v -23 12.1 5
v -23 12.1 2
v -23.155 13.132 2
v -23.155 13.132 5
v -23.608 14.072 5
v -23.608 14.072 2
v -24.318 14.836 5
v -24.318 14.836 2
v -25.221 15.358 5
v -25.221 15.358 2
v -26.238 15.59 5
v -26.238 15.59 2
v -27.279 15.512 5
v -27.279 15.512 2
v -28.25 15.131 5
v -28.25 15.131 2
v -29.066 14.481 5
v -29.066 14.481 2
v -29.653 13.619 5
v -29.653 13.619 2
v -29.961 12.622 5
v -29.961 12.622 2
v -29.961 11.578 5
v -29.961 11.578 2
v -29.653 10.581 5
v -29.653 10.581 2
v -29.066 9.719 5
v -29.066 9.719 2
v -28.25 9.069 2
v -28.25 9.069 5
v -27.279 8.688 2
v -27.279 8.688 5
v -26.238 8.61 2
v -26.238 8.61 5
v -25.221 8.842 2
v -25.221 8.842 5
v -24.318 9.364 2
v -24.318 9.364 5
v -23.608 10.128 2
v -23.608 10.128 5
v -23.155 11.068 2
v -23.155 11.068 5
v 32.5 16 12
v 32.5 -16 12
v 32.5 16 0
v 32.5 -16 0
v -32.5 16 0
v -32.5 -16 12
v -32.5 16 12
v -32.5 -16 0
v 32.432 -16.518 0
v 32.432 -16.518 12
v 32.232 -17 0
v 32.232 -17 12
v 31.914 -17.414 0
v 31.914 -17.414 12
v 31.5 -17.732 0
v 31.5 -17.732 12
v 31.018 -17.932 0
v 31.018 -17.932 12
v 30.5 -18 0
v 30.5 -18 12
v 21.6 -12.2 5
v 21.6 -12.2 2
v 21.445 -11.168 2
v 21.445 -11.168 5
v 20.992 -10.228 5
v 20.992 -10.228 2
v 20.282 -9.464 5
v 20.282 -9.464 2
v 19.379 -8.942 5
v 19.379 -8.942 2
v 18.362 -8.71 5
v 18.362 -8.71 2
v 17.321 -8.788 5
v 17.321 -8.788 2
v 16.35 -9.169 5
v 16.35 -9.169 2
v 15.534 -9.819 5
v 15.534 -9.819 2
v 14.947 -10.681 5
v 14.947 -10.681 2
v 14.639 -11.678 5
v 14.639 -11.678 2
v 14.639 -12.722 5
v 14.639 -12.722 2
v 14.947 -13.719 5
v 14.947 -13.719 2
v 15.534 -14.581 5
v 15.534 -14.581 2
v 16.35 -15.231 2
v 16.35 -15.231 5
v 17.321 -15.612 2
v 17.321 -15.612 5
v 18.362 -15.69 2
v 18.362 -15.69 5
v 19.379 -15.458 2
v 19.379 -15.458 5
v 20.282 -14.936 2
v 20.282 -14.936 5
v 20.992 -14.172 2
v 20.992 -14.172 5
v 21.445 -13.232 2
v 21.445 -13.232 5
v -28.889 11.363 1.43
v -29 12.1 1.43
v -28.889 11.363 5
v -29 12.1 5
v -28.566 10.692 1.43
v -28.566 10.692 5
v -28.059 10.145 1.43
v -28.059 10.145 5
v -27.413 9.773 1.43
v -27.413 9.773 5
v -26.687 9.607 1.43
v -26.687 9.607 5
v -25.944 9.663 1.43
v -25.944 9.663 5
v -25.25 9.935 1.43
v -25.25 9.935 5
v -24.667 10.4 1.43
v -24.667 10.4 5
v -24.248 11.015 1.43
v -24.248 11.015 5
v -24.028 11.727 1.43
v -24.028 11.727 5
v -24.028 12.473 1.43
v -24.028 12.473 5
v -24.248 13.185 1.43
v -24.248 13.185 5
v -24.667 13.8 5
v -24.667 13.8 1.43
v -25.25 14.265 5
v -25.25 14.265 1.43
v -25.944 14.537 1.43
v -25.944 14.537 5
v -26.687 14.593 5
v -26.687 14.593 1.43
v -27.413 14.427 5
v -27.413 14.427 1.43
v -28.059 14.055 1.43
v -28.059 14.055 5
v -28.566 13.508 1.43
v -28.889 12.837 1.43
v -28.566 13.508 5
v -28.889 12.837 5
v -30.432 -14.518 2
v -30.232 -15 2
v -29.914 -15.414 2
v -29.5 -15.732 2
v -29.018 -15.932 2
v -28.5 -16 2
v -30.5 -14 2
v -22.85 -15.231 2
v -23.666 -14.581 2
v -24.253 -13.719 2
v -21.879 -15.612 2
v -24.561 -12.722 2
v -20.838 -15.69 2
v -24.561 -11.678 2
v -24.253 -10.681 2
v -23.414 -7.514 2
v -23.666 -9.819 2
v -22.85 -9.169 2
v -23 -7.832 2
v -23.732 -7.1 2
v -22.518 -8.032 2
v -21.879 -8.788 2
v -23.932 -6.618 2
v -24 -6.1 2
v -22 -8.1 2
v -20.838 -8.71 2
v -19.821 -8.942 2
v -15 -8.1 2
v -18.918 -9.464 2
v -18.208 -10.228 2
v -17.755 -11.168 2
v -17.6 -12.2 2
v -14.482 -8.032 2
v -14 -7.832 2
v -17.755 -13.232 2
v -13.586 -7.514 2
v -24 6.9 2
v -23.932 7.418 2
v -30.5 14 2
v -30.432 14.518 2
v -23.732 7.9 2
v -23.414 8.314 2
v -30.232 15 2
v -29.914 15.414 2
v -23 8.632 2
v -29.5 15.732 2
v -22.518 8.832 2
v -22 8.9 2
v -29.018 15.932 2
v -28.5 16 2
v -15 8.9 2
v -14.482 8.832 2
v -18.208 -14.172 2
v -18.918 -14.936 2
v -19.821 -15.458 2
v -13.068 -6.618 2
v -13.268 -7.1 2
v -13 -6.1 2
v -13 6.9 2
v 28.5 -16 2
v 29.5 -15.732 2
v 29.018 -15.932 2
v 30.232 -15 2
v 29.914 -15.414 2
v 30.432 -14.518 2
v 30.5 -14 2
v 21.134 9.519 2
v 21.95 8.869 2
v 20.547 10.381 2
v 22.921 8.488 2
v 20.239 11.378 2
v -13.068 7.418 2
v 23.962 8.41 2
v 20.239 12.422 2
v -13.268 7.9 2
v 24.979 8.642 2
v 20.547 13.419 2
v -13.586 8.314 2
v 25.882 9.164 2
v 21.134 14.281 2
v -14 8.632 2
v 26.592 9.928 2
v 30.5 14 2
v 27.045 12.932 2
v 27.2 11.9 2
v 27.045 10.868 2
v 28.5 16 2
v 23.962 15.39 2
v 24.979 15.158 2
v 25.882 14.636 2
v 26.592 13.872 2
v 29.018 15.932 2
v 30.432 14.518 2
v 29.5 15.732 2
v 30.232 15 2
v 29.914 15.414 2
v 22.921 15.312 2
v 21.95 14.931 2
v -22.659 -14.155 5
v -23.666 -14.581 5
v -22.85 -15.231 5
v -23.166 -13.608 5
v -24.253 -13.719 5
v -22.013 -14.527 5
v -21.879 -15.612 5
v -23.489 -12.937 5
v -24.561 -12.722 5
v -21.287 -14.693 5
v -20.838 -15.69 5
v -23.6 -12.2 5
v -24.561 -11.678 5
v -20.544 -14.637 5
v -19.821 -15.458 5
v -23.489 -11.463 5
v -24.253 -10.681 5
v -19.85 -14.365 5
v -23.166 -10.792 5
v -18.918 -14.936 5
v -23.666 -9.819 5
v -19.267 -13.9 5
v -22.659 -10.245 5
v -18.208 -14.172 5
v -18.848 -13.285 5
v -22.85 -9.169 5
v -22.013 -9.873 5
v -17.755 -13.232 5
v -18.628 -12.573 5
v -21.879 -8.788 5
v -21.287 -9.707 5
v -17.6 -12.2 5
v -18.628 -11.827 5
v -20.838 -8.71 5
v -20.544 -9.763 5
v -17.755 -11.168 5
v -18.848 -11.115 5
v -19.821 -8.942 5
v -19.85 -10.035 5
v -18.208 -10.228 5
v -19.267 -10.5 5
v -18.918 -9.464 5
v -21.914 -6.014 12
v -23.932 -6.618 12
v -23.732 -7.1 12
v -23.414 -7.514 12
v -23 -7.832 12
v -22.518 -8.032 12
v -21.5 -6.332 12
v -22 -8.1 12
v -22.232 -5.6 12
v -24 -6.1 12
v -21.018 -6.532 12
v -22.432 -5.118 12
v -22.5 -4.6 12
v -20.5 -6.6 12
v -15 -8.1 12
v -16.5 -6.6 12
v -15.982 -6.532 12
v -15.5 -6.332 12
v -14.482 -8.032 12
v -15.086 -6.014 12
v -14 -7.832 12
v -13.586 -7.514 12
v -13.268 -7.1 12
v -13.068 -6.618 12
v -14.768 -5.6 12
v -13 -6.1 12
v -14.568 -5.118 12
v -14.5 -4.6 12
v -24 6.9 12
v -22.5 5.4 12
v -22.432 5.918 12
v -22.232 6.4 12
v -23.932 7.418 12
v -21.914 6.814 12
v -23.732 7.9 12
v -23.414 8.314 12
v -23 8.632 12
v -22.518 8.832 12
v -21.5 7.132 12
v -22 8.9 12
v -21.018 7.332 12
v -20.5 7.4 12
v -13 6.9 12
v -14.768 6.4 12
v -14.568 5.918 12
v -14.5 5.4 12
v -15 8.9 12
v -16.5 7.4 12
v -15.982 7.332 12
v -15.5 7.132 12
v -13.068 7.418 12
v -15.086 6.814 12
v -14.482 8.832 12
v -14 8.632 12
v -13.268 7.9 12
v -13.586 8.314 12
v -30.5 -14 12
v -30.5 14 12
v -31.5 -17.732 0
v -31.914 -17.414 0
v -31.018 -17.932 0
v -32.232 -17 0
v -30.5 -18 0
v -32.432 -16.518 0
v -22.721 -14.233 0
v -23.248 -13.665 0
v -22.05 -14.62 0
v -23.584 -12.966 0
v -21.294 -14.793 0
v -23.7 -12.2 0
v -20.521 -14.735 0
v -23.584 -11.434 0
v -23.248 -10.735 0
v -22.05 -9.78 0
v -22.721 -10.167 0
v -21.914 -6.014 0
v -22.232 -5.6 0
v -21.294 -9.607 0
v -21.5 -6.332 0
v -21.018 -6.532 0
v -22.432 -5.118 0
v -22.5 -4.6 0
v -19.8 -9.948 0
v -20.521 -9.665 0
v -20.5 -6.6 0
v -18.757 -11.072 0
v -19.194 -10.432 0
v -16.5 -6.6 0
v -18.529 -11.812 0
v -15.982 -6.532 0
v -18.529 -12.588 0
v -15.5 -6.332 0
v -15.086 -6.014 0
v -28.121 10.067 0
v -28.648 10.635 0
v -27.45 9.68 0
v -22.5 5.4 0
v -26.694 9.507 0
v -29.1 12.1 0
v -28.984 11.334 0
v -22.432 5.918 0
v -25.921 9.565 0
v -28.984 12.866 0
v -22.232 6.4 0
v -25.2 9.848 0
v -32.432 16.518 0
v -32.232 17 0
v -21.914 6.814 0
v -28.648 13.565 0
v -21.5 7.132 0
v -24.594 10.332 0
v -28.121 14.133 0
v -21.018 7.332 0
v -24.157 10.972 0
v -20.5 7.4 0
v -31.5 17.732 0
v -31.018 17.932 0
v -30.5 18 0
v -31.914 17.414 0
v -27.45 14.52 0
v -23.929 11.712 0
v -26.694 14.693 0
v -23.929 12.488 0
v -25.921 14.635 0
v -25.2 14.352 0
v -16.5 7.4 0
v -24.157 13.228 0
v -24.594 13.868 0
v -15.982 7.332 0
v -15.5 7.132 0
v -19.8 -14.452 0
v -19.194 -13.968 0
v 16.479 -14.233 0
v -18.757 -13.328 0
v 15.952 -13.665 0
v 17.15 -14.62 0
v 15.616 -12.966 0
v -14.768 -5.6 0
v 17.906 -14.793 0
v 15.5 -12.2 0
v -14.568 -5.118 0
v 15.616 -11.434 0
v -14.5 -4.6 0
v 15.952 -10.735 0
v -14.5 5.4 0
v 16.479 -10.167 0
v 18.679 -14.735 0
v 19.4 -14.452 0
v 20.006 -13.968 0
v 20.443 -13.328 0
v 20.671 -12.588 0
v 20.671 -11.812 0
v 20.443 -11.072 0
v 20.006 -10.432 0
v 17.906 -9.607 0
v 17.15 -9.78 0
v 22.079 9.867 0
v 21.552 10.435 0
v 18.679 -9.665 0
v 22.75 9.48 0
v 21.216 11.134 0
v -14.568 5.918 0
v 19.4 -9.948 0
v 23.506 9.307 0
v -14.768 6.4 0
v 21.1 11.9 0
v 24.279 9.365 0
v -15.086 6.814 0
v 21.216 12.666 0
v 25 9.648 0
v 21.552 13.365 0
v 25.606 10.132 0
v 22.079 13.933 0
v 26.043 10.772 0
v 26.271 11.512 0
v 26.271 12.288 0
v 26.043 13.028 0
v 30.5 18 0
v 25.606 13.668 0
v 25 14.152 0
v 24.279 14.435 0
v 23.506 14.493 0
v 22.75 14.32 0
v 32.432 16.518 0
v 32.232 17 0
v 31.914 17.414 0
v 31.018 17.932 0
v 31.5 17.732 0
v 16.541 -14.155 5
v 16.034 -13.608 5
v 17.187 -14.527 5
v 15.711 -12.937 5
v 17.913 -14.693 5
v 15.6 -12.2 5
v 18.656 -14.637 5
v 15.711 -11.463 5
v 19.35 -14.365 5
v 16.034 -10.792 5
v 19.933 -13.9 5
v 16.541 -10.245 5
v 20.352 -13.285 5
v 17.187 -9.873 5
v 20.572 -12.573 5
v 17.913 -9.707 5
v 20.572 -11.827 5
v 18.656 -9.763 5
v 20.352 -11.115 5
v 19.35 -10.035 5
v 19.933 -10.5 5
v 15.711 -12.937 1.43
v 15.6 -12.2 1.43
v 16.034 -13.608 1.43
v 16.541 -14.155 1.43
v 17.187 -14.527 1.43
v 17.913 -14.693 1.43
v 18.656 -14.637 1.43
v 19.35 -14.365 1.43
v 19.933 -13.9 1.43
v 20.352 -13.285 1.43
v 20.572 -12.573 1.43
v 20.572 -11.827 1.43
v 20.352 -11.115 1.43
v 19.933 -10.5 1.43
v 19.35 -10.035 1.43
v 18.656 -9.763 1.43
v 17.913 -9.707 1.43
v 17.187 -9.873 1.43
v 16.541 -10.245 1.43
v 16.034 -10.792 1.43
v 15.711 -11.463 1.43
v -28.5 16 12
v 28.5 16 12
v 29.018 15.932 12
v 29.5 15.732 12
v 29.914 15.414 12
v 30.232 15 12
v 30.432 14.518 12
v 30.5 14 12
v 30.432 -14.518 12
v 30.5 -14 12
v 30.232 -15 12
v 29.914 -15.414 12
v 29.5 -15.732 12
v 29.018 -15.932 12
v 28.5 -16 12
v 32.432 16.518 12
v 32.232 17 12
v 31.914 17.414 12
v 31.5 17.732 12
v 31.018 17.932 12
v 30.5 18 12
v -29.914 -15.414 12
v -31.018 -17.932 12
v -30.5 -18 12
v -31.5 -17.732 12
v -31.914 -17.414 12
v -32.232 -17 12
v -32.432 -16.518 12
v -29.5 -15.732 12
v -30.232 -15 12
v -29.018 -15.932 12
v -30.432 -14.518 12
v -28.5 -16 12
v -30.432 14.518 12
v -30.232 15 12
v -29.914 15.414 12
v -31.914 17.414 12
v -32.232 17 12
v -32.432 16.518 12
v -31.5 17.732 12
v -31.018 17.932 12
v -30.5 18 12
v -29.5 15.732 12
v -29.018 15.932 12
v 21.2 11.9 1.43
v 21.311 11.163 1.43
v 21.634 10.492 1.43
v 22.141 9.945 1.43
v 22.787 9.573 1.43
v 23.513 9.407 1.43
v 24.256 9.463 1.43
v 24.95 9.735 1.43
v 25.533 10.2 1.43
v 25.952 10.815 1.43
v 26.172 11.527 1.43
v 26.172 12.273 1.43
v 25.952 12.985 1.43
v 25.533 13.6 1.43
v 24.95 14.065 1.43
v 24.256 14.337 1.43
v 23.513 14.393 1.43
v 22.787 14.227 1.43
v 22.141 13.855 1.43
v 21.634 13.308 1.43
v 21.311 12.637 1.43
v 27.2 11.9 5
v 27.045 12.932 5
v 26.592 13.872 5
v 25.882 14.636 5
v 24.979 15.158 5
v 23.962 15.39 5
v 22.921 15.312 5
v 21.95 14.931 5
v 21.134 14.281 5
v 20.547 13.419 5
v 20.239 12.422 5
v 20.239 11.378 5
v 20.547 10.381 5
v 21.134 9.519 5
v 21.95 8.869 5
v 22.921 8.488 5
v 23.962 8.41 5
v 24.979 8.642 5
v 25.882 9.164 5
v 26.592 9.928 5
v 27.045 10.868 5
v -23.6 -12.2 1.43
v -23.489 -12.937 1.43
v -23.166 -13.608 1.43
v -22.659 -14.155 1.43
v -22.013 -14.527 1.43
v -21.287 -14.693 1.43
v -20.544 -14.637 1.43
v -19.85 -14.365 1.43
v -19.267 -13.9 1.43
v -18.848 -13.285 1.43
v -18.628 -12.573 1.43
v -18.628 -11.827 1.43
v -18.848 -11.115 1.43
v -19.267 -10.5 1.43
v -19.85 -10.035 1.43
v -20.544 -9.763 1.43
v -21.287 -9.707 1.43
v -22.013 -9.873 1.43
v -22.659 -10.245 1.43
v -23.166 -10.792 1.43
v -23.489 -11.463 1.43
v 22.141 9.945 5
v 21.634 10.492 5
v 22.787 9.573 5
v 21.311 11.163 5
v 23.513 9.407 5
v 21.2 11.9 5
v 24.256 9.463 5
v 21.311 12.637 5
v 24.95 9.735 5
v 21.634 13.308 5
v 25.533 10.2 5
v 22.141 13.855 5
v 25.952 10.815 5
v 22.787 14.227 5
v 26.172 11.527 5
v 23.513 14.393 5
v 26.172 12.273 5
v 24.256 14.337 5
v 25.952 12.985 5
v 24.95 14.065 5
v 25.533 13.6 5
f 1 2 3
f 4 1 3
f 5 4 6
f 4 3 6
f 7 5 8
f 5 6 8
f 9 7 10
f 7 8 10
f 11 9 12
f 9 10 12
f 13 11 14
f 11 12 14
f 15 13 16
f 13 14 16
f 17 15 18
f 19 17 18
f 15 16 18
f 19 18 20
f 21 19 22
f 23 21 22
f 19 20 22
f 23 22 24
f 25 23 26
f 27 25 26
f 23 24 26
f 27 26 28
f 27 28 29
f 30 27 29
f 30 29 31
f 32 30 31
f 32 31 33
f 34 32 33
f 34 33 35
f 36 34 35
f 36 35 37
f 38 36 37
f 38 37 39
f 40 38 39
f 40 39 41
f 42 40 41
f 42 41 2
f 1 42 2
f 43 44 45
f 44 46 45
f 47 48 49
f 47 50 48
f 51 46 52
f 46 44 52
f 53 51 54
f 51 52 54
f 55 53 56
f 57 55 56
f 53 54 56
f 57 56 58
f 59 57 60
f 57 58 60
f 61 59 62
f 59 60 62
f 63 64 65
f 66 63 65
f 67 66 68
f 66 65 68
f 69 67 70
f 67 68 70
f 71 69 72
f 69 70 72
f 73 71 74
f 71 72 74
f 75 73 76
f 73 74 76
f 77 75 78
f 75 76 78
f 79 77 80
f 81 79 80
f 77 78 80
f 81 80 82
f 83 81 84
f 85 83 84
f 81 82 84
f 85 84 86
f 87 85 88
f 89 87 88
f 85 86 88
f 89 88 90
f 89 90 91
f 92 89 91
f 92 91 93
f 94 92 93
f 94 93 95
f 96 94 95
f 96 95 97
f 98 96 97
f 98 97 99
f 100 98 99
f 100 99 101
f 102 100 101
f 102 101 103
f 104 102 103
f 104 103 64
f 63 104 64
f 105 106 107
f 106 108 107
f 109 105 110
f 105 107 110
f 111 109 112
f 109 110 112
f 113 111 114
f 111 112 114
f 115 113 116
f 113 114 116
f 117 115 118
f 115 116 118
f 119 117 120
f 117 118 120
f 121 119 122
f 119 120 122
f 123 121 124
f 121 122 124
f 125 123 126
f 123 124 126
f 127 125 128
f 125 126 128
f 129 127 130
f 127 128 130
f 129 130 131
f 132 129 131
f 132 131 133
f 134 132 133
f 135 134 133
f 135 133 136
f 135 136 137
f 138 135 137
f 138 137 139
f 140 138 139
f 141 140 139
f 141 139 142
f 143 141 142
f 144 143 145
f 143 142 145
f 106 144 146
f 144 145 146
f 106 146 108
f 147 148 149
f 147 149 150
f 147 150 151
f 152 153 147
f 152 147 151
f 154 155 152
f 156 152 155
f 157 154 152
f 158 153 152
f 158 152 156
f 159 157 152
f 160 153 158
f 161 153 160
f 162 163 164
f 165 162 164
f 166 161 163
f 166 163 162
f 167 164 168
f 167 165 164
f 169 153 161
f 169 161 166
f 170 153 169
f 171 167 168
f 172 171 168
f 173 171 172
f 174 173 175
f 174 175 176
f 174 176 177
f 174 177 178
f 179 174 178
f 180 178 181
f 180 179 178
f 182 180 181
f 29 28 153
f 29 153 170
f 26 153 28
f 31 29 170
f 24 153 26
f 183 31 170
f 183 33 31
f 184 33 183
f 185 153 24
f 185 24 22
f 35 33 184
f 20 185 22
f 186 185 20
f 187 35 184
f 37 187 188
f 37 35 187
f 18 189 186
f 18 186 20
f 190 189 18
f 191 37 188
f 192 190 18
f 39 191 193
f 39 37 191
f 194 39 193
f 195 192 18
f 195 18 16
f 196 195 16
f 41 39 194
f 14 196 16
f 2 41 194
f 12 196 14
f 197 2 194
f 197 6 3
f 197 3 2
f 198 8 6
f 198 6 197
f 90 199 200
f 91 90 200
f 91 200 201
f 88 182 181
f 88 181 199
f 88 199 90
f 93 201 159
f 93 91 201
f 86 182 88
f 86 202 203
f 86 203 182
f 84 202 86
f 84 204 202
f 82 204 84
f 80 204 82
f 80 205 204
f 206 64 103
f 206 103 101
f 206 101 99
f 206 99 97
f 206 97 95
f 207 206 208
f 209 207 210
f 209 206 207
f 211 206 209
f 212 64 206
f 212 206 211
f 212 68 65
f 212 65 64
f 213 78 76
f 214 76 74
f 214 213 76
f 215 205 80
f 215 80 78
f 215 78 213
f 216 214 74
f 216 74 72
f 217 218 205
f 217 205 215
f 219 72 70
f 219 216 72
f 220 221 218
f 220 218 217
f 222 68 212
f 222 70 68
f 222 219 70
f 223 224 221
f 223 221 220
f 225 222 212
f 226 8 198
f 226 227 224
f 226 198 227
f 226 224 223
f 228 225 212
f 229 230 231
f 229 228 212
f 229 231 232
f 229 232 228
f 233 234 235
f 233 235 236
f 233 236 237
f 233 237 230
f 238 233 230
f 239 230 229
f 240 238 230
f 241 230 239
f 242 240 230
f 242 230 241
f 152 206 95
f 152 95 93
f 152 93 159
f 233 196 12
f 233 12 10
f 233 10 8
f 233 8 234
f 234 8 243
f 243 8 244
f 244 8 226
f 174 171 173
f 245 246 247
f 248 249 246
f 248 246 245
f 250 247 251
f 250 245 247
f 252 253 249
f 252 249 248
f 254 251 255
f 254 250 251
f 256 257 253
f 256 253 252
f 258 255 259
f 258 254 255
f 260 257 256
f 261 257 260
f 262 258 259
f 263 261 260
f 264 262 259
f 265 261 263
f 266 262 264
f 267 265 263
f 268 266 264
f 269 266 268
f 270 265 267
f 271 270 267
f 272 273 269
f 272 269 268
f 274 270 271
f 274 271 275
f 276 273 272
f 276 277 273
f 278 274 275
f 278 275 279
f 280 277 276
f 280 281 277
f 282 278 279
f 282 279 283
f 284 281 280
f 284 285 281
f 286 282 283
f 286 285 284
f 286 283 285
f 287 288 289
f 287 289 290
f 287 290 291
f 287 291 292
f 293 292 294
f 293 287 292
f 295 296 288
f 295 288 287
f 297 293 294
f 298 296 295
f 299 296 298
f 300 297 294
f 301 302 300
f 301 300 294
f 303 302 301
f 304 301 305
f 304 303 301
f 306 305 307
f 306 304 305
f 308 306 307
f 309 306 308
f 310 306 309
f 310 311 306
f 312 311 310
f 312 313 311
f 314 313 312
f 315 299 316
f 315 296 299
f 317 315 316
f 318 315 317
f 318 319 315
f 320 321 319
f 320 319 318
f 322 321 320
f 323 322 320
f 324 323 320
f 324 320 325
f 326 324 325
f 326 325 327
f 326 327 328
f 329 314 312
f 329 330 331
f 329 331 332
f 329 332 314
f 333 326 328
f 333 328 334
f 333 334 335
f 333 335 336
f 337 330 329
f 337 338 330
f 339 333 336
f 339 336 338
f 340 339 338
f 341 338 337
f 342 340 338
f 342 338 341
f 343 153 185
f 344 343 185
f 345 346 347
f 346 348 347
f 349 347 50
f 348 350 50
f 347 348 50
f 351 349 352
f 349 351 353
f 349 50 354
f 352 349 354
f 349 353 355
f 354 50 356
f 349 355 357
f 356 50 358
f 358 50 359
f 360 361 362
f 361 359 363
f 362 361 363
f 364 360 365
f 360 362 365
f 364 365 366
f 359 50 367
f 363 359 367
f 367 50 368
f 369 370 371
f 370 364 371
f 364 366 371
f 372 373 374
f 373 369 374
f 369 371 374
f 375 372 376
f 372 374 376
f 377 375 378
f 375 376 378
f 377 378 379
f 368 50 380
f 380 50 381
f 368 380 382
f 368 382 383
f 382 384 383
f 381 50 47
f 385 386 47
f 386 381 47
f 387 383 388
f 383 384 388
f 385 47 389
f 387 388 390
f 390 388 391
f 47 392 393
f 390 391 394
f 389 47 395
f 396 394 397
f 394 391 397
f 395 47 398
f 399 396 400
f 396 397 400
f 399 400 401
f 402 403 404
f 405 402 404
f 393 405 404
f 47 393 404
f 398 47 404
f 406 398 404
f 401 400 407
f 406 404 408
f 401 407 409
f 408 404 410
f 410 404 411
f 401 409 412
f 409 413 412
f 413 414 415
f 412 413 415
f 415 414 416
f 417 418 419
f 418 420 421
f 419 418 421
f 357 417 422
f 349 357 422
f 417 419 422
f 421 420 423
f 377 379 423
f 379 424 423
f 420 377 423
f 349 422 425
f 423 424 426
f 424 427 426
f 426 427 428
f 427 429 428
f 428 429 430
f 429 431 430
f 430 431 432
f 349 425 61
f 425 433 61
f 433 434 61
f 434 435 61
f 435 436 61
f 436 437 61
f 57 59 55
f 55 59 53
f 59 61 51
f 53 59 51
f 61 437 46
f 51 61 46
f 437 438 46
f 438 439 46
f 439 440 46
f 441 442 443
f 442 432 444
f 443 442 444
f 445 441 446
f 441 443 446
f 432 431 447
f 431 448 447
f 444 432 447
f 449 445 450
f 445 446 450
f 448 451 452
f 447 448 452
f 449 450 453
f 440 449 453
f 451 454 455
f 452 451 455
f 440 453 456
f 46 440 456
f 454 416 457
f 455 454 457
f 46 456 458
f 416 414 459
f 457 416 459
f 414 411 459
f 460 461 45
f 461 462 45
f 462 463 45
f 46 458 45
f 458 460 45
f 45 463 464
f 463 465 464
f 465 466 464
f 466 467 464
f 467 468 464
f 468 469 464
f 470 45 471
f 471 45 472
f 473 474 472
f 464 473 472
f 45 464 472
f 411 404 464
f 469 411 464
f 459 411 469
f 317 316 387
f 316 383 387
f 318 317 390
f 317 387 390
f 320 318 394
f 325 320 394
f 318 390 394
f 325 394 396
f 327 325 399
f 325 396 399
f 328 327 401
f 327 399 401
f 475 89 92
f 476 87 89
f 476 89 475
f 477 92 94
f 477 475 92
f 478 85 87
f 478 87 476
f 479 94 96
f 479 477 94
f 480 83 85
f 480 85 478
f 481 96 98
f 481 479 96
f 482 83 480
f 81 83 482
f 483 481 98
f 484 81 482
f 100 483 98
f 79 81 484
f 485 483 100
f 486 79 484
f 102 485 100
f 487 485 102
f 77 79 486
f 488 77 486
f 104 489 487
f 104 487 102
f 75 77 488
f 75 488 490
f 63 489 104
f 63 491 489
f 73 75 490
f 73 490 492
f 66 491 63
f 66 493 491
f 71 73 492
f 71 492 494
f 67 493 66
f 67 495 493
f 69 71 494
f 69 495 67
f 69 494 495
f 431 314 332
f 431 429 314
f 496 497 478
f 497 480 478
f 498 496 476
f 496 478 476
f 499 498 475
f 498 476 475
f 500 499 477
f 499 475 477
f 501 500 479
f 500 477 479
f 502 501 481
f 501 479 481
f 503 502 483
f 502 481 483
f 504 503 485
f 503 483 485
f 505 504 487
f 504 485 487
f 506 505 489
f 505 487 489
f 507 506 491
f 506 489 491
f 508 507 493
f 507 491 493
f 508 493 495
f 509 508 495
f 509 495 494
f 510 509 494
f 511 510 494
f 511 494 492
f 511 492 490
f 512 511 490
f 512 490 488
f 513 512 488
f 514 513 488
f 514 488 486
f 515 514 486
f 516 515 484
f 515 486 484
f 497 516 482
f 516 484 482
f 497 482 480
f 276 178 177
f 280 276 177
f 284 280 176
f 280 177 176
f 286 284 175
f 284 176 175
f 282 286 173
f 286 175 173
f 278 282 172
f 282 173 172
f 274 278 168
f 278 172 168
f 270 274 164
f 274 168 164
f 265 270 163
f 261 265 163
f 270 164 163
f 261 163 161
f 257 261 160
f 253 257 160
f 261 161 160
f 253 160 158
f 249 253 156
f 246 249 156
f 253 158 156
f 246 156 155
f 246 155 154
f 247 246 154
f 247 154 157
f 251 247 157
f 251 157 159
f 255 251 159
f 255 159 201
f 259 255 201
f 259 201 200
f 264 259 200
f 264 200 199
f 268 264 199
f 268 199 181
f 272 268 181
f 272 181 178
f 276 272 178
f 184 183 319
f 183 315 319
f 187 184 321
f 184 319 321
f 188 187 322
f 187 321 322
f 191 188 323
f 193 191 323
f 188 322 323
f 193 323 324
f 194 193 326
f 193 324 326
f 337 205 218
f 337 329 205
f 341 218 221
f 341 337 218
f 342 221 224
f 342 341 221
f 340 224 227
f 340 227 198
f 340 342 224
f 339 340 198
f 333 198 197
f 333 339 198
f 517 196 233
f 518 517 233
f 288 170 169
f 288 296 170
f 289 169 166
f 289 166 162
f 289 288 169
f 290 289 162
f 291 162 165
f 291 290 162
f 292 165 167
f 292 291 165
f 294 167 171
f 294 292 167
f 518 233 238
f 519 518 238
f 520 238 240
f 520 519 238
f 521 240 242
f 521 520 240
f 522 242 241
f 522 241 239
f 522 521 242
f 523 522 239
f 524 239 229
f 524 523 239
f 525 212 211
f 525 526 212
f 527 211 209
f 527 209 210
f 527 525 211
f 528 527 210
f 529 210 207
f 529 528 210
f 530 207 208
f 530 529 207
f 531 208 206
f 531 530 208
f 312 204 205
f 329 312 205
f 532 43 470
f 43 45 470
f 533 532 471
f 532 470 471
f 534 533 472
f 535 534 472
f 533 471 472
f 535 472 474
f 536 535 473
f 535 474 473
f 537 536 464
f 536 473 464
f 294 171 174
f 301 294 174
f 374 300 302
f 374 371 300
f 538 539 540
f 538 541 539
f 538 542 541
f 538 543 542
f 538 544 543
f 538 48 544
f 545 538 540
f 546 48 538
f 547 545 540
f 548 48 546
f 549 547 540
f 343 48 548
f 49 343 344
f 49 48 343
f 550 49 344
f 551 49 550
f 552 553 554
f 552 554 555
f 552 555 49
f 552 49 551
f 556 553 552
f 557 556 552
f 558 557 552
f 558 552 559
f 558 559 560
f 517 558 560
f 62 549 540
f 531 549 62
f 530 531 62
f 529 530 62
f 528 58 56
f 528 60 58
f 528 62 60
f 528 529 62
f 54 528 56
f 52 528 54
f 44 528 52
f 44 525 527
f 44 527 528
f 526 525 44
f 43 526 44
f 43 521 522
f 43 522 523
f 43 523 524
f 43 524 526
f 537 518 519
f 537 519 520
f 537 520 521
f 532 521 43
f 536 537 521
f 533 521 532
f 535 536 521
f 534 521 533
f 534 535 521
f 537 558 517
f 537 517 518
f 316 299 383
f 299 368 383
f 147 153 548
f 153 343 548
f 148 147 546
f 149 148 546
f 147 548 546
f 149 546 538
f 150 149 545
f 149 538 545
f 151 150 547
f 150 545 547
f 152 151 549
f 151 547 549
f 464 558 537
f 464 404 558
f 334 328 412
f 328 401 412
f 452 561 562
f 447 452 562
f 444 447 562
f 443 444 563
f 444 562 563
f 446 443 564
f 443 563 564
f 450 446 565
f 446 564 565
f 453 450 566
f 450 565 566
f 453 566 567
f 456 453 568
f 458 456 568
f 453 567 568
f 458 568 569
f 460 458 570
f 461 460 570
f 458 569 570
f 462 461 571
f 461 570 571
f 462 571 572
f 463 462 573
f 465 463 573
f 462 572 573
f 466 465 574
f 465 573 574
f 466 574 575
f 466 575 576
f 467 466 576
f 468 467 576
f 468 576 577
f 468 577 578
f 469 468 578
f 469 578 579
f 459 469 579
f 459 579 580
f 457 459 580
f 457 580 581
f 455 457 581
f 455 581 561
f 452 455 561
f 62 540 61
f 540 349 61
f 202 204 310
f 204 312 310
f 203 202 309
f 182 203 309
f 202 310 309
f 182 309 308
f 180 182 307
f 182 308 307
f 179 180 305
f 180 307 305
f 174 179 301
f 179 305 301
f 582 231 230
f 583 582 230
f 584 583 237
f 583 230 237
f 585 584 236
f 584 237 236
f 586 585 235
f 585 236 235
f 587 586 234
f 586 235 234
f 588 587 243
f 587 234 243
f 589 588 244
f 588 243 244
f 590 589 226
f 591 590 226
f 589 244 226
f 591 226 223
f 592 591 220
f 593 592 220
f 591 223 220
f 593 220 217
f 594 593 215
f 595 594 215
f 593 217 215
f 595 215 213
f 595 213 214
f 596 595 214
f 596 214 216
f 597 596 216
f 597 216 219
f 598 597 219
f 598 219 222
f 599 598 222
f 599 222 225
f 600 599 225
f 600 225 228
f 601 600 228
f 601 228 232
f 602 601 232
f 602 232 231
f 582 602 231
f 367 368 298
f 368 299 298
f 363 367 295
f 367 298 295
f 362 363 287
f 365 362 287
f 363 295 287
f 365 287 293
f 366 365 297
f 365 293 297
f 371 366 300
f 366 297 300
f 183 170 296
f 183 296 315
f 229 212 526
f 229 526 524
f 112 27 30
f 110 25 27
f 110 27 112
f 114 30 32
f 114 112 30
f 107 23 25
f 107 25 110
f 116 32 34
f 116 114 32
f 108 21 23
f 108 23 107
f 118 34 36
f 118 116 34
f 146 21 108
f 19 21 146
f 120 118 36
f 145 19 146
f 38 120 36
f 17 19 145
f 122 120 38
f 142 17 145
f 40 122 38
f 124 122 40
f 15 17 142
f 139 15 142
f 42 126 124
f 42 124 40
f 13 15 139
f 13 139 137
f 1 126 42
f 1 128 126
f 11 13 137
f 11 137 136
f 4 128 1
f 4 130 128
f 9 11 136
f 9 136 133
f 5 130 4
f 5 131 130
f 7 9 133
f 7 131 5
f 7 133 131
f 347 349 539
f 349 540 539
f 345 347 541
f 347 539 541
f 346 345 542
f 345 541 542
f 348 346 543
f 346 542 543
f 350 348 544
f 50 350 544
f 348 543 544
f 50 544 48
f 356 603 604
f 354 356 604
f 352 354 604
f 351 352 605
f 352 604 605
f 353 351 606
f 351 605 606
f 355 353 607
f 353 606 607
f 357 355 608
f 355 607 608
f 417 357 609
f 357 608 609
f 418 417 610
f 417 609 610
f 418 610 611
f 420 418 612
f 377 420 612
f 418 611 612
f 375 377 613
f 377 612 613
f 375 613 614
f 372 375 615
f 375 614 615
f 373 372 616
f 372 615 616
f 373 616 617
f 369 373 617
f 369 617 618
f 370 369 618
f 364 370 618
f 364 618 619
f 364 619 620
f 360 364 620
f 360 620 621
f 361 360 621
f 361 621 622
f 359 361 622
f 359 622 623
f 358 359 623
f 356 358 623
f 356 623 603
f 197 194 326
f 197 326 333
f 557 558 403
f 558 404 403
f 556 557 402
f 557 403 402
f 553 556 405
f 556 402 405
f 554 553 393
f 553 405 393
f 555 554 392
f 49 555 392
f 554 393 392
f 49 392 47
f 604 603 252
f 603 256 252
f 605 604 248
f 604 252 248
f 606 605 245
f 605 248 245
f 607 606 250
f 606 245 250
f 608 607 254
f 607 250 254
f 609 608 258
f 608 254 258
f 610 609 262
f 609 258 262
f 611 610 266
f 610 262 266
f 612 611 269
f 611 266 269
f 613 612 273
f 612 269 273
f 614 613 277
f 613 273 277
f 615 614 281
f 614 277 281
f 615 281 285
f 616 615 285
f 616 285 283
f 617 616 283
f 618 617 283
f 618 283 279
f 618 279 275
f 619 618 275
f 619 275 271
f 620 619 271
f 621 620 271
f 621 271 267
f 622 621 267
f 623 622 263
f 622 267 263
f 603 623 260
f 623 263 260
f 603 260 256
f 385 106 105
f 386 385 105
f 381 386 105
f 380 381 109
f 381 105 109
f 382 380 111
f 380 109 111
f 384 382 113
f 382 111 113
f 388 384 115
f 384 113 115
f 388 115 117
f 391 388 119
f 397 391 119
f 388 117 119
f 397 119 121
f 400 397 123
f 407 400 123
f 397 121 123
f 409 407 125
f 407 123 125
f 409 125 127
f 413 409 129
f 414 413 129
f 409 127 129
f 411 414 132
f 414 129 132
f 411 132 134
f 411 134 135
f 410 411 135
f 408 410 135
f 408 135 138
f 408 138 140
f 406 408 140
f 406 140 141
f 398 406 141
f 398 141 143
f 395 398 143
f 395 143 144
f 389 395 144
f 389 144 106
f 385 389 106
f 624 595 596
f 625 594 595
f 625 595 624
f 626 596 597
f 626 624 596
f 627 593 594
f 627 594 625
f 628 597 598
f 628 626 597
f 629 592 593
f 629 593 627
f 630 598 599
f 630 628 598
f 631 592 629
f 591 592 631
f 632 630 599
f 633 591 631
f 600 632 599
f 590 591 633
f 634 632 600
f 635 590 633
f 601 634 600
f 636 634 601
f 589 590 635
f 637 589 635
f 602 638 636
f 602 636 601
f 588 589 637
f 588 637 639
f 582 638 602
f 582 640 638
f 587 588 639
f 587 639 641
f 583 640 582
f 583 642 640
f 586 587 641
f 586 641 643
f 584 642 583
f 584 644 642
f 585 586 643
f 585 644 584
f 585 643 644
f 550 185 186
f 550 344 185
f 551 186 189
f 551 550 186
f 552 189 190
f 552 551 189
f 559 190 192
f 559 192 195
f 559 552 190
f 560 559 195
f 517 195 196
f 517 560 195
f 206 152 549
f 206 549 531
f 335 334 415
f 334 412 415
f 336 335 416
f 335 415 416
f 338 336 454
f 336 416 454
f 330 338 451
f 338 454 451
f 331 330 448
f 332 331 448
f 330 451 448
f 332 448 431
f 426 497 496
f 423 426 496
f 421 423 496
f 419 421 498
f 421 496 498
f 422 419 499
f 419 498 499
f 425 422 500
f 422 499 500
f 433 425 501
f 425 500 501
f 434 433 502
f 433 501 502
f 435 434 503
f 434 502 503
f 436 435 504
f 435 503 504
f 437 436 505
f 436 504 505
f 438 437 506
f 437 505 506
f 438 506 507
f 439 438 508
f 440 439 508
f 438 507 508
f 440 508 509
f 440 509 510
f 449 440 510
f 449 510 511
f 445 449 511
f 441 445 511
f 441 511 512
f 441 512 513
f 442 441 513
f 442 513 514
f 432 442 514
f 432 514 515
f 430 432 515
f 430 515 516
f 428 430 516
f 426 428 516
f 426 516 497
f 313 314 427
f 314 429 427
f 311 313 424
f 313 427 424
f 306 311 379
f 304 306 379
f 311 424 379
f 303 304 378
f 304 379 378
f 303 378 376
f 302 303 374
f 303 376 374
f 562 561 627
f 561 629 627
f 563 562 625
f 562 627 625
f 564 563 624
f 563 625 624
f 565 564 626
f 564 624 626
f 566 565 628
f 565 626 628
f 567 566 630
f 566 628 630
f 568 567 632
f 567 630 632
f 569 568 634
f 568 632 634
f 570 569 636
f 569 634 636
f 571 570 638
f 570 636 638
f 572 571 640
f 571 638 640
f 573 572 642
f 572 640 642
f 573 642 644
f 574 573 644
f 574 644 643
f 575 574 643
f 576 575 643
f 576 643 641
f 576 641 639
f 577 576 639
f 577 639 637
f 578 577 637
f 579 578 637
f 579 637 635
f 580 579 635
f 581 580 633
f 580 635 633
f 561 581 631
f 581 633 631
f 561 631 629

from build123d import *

# Parameters (mm, degrees)
SKETCH_W         = 65
SKETCH_H         = 36
PAD_DEPTH        = 2
SKETCH001_W      = 65
SKETCH001_H      = 36
SKETCH001_W_2    = 61
SKETCH001_H_2    = 32
PAD001_DEPTH     = 10
SKETCH002_R      = 3.5
PAD002_DEPTH     = 5
HOLE_D           = 5
HOLE_CSINK_D     = 5.2
HOLE_CSINK_ANGLE = 8
SKETCH003_W      = 8
SKETCH003_H      = 14
POCKET_DEPTH     = 12.001
SKETCH004_W      = 11
SKETCH004_H      = 17
SKETCH004_W_2    = 8
SKETCH004_H_2    = 14
PAD003_DEPTH     = 10
FILLET_R         = 2


with BuildPart() as part:
    # Sketch → Pad (new body)
    with BuildSketch(Plane.XY):
        Rectangle(SKETCH_W, SKETCH_H)
    extrude(amount=PAD_DEPTH)

    # Sketch001 → Pad001 (join)
    with BuildSketch(Plane.XY.offset(2)):
        Rectangle(SKETCH001_W, SKETCH001_H)
        Rectangle(SKETCH001_W_2, SKETCH001_H_2, mode=Mode.SUBTRACT)
    extrude(amount=PAD001_DEPTH)

    # Sketch002 → Pad002 (join)
    with BuildSketch(Plane.XY):
        with Locations((-26.5, 12.1)):
            Circle(SKETCH002_R)
        with Locations((-21.1, -12.2)):
            Circle(SKETCH002_R)
        with Locations((23.7, 11.9)):
            Circle(SKETCH002_R)
        with Locations((18.1, -12.2)):
            Circle(SKETCH002_R)
    extrude(amount=PAD002_DEPTH)

    # Hole (through all)
    with Locations(Plane(origin=(0, 0, 0), x_dir=(1, 0, 0), z_dir=(0, 0, -1))):
        with Locations((-26.5, -12.1), (-21.1, 12.2), (23.7, -11.9), (18.1, 12.2)):
            CounterSinkHole(HOLE_D / 2, HOLE_CSINK_D / 2, counter_sink_angle=HOLE_CSINK_ANGLE)

    # Sketch003 → Pocket (cut, through all)
    with BuildSketch(Plane.XY):
        with Locations((-18.5, 0.4)):
            Rectangle(SKETCH003_W, SKETCH003_H)
    extrude(amount=POCKET_DEPTH, mode=Mode.SUBTRACT)

    # Sketch004 → Pad003 (join)
    with BuildSketch(Plane.XY.offset(2)):
        with Locations((-18.5, 0.4)):
            Rectangle(SKETCH004_W, SKETCH004_H)
        with Locations((-18.5, 0.4)):
            Rectangle(SKETCH004_W_2, SKETCH004_H_2, mode=Mode.SUBTRACT)
    extrude(amount=PAD003_DEPTH)

    # Fillet
    fillet_edges = [part.edges().sort_by_distance(p)[0] for p in [
        (-32.5, -18, 7),
        (-30.5, -16, 7),
        (-32.5, 18, 7),
        (-30.5, 16, 7),
        (32.5, -18, 7),
        (30.5, -16, 7),
        (30.5, 16, 7),
        (32.5, 18, 7),
        (-13, -8.1, 7),
        (-24, -8.1, 7),
        (-22.5, -6.6, 7),
        (-14.5, -6.6, 7),
        (-24, 8.9, 7),
        (-22.5, 7.4, 7),
        (-13, 8.9, 7),
        (-14.5, 7.4, 7),
    ]]
    fillet(fillet_edges, radius=FILLET_R)


solid = part.part
